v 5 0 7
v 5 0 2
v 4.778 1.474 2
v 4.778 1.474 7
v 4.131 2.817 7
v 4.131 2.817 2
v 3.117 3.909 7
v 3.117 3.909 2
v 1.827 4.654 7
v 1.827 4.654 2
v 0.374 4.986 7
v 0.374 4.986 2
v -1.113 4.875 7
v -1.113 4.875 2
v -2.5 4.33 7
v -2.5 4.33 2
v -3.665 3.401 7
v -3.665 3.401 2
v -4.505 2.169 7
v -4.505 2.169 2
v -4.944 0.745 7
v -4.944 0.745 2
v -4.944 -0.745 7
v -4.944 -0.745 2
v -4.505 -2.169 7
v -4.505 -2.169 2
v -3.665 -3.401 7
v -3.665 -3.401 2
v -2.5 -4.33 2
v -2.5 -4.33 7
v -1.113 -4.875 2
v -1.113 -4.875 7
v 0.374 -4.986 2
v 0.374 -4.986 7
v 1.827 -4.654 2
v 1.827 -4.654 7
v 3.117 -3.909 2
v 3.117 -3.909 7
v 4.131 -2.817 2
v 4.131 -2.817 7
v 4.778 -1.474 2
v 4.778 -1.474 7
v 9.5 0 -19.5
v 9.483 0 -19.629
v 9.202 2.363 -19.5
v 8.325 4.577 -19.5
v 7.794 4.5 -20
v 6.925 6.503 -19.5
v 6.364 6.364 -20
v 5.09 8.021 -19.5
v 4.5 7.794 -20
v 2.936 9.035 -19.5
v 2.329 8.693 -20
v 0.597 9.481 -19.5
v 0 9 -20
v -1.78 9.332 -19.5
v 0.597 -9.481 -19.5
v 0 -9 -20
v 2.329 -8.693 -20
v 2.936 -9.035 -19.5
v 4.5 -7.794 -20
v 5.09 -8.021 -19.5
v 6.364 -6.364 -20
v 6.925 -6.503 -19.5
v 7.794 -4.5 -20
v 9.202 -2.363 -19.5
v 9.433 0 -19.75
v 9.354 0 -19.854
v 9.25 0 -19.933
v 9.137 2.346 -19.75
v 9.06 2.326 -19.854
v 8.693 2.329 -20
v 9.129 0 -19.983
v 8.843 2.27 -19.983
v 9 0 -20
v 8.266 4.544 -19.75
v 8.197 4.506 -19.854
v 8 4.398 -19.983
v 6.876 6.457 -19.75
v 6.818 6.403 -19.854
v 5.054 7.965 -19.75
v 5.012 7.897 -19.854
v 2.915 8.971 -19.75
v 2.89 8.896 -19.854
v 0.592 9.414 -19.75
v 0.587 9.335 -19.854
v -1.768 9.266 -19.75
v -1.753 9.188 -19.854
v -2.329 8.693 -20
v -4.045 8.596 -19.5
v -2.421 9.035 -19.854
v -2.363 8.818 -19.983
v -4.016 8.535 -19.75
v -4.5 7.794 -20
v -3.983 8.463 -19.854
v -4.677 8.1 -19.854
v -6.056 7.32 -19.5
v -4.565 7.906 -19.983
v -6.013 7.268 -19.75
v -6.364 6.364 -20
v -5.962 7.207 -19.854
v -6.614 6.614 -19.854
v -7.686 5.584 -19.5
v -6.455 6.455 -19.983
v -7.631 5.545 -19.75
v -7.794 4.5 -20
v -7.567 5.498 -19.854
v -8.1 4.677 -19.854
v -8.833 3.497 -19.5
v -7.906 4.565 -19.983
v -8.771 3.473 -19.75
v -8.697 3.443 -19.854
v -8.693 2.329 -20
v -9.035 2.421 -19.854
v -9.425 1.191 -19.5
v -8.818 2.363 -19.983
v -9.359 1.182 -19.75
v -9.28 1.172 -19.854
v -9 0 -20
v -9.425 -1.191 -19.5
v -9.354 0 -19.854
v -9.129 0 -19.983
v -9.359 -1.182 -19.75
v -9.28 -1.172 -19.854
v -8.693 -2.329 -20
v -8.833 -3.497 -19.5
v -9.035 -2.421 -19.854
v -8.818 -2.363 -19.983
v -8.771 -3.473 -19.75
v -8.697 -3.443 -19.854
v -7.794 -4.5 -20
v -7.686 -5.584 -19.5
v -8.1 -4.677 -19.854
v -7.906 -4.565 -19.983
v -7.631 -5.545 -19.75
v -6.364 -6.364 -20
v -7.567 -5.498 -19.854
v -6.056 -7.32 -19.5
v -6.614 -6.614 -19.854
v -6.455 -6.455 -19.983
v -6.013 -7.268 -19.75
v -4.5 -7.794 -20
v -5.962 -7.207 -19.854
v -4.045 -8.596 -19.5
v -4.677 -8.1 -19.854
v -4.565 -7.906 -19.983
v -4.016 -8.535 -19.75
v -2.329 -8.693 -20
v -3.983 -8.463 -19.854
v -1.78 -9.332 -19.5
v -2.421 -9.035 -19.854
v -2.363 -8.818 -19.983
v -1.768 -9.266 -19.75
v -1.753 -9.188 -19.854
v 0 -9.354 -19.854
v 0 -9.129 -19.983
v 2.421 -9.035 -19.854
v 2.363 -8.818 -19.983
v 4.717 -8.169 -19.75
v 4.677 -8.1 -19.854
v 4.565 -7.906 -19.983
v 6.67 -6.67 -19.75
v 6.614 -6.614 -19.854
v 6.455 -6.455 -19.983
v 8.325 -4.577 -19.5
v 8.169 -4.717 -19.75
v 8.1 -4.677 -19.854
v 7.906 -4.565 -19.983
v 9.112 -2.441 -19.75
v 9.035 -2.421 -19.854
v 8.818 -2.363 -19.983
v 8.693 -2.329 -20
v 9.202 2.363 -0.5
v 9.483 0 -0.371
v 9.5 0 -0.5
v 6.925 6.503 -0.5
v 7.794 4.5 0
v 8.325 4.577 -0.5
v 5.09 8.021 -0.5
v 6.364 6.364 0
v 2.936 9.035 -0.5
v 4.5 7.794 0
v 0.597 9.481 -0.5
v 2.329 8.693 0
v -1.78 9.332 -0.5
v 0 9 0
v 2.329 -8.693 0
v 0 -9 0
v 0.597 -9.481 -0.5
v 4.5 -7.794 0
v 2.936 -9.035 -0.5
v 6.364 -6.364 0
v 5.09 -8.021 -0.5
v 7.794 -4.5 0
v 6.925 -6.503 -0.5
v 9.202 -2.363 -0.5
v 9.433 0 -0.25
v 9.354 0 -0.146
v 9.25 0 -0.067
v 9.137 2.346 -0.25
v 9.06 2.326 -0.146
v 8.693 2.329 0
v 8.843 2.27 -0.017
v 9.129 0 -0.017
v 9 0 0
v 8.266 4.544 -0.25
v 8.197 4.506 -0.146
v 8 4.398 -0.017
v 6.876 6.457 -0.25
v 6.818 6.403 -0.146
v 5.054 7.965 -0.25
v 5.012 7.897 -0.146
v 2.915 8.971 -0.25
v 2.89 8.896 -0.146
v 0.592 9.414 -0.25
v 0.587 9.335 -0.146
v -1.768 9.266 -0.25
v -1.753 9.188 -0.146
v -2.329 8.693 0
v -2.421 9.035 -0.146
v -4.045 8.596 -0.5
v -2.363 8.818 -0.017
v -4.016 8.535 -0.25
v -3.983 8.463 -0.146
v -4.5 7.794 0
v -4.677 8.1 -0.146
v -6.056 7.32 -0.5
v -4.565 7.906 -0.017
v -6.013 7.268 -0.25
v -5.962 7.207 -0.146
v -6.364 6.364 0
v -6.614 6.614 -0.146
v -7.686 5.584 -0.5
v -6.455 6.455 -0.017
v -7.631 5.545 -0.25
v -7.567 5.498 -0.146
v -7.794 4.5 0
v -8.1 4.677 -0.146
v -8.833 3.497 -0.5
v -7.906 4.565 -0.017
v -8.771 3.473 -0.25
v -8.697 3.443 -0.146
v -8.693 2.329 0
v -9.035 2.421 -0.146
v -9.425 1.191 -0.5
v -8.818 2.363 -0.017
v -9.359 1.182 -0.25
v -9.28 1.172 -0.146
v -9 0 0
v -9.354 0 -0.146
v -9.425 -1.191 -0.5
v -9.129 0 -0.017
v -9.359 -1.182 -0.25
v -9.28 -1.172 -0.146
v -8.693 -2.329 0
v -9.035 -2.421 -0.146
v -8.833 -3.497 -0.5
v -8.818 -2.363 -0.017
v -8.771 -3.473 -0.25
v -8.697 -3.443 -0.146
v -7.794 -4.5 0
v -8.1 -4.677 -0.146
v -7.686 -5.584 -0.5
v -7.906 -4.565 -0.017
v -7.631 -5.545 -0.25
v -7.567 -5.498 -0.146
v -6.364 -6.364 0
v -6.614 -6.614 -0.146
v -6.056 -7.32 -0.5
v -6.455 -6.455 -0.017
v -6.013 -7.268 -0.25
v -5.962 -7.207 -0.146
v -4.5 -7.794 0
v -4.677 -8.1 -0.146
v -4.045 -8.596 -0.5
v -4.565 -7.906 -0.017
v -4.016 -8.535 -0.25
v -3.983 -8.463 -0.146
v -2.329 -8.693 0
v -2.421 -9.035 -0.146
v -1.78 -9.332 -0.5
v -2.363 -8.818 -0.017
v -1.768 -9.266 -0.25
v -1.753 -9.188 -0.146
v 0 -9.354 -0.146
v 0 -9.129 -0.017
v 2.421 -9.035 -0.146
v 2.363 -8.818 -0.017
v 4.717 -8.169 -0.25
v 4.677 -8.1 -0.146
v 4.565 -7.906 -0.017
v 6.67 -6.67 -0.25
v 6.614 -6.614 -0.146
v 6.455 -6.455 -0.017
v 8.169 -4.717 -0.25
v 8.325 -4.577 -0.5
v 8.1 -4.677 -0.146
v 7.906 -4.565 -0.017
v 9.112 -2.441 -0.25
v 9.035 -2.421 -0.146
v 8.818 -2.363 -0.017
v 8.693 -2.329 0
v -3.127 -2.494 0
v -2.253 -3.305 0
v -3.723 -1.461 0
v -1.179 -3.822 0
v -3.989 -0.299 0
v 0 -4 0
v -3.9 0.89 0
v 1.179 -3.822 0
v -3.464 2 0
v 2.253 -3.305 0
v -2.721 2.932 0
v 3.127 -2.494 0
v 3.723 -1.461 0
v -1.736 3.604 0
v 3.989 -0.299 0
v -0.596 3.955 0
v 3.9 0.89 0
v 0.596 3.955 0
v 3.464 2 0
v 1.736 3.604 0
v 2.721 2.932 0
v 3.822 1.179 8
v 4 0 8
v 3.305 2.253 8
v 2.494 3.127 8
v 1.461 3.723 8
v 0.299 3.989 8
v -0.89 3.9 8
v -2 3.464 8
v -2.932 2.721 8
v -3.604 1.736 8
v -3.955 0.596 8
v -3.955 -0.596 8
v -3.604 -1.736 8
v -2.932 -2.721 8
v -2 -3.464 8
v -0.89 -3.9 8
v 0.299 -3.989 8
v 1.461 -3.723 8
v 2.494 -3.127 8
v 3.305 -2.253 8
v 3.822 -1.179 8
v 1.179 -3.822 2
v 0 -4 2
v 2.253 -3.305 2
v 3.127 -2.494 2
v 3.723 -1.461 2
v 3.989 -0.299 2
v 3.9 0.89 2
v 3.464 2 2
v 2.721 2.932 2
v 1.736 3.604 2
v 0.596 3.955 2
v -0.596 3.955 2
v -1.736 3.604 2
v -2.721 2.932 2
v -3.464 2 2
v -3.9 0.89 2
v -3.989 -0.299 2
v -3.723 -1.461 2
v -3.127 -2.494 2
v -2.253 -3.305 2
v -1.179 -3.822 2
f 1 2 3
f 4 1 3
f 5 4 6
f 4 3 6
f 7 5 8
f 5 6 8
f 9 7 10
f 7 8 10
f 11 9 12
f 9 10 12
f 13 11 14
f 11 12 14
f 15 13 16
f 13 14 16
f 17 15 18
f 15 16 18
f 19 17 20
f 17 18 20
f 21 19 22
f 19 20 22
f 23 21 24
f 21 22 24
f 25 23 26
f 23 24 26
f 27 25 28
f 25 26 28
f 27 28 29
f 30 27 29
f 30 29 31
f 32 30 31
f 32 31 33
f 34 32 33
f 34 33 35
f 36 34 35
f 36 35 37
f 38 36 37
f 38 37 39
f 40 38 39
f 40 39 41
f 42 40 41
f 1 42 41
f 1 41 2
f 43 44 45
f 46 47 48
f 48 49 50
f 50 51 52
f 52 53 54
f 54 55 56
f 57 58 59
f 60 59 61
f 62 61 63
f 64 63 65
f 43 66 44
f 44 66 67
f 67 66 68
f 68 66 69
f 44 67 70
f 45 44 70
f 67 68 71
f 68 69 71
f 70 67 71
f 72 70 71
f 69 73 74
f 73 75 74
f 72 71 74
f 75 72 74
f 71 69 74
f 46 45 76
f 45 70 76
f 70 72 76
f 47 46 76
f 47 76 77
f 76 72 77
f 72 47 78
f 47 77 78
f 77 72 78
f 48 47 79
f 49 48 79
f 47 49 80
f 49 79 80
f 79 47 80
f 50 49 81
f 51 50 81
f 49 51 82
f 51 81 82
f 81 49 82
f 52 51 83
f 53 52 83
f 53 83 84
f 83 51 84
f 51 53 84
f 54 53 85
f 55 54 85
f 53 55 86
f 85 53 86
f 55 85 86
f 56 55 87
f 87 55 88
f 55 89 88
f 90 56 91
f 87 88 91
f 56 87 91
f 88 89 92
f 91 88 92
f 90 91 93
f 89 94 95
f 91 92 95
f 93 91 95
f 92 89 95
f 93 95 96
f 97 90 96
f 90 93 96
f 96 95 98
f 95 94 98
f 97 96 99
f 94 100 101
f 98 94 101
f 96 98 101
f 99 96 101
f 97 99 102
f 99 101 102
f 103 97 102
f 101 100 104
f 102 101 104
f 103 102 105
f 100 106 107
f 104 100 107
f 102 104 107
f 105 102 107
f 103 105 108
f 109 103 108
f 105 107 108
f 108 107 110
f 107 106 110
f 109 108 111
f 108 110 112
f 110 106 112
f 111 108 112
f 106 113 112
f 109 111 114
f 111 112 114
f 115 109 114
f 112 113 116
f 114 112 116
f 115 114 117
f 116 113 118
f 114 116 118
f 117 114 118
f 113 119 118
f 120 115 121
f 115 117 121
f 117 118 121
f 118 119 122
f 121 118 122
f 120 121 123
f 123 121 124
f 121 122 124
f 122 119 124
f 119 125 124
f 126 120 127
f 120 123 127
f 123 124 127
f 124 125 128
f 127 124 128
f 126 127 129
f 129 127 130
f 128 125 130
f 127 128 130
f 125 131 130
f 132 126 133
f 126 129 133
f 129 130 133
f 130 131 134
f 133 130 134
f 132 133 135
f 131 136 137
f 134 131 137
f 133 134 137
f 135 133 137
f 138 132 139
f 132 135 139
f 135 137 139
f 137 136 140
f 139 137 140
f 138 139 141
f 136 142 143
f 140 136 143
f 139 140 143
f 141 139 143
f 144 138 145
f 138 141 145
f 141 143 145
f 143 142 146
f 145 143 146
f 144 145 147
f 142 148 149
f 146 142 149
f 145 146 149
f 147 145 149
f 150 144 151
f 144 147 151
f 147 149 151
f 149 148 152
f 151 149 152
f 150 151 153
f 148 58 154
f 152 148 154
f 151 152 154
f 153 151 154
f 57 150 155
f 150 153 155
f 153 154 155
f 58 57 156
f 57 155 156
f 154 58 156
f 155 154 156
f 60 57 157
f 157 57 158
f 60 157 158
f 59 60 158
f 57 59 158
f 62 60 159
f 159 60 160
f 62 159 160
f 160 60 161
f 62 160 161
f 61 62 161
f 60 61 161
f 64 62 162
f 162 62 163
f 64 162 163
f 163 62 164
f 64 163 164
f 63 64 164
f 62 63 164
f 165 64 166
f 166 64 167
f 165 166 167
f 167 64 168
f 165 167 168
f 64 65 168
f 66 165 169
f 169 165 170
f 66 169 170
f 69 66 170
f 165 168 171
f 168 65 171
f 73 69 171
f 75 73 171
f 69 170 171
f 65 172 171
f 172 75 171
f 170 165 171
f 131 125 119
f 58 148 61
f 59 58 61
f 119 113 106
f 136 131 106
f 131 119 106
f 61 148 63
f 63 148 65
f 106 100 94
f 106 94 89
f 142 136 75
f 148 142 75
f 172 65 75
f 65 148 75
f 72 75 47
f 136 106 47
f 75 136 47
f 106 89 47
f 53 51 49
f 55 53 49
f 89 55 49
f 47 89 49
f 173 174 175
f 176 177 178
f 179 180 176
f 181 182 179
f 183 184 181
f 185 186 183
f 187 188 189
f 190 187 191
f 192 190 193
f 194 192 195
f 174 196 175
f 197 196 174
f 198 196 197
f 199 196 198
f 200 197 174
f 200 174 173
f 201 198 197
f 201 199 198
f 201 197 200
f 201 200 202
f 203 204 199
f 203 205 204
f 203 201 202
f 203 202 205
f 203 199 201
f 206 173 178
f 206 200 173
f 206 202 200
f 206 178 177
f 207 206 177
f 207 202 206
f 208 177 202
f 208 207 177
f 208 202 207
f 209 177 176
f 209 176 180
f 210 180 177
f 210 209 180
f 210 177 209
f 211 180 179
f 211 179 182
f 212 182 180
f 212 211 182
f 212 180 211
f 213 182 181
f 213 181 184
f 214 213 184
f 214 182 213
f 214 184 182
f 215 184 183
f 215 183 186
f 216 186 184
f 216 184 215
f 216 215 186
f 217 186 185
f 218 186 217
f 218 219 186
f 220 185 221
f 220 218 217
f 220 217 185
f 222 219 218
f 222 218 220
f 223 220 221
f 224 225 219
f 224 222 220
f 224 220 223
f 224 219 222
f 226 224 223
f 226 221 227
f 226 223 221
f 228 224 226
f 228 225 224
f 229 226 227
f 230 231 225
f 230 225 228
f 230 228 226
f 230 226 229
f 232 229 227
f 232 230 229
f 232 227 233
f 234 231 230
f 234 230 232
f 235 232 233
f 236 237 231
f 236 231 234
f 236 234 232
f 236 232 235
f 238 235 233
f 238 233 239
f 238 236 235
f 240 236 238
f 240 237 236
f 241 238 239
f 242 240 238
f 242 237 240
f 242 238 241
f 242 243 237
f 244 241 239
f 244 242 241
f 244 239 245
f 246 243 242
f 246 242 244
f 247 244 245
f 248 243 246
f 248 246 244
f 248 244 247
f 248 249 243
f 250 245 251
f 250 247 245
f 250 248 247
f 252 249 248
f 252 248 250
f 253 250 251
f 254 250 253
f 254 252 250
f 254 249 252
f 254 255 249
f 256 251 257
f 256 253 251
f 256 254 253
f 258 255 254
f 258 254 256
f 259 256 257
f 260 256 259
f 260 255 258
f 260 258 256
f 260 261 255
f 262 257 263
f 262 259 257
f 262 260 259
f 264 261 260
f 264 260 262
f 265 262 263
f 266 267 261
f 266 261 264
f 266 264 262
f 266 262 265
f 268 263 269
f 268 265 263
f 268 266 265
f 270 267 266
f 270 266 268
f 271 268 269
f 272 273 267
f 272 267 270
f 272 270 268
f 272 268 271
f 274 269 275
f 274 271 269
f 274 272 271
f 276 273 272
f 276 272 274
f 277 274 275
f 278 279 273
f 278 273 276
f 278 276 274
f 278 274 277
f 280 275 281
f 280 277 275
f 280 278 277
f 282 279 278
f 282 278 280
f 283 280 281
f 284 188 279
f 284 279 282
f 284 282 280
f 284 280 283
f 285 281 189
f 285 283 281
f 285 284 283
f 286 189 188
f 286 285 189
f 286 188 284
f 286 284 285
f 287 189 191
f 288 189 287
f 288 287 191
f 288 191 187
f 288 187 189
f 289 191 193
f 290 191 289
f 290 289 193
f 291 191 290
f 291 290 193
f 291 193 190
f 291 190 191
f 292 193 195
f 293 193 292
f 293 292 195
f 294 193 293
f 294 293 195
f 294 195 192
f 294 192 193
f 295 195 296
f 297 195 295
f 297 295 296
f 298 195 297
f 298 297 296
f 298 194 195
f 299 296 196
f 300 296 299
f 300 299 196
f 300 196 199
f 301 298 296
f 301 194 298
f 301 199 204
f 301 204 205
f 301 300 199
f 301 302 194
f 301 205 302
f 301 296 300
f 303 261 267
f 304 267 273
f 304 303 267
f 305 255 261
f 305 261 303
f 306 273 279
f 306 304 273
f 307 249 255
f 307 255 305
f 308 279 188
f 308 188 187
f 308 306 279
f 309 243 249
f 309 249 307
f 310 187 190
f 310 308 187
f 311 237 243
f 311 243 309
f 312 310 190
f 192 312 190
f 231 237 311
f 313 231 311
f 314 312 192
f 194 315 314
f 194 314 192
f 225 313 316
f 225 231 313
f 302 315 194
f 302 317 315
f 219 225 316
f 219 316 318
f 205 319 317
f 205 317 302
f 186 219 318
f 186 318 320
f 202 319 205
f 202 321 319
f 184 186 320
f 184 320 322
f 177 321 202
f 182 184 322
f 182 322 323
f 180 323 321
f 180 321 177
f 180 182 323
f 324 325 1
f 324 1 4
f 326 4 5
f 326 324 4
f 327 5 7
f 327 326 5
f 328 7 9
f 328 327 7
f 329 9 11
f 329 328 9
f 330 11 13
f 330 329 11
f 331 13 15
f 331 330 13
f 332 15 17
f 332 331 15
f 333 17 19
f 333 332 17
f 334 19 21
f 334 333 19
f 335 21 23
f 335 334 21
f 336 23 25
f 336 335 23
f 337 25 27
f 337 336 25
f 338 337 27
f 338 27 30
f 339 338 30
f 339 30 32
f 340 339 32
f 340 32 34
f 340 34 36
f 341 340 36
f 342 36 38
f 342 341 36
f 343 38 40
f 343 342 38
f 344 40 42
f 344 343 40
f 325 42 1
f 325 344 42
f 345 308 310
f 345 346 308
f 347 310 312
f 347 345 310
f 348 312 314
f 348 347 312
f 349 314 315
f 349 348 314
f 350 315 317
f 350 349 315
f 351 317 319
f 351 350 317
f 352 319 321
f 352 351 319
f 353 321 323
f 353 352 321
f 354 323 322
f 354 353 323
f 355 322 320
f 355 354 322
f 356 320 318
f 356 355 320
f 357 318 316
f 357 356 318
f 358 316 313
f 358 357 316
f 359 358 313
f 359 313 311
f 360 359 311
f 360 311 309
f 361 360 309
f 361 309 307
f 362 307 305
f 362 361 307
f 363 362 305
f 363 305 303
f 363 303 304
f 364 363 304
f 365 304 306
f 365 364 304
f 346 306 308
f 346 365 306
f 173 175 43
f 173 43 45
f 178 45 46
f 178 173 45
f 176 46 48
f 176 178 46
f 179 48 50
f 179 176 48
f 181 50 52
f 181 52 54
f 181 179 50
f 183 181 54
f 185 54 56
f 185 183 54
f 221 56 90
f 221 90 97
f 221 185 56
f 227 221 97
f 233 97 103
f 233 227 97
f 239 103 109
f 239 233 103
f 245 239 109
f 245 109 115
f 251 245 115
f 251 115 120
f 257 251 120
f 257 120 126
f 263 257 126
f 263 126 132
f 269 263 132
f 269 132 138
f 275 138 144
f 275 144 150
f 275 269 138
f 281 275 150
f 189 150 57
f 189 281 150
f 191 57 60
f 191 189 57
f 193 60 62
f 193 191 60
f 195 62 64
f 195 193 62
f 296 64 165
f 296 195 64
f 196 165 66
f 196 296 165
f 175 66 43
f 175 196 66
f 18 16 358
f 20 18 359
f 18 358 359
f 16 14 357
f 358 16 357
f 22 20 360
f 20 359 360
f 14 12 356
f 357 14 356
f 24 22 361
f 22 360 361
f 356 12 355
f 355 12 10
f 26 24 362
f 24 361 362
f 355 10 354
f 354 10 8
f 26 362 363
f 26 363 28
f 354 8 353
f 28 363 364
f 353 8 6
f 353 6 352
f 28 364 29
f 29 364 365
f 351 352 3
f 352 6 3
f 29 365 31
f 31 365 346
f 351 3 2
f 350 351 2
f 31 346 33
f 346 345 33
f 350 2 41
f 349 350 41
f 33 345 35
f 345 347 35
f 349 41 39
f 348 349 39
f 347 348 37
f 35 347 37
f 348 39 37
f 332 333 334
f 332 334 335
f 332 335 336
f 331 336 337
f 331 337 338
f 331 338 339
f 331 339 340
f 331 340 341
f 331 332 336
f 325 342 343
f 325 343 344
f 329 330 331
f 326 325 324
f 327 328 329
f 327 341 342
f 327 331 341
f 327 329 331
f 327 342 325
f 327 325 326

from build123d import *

# Parameters (mm, degrees)
F0_R     = 9.5
F1_DEPTH = 20
F2_R     = 5
F3_DEPTH = 8
F4_R     = 0.5
F5_SIZE  = 1
F6_W     = 1
F6_H     = 2


with BuildPart() as f1:
    # F0 (on Top) → F1 (new body)
    with BuildSketch(Plane.XY):
        Circle(F0_R)
    extrude(amount=-F1_DEPTH)

    # F2 (on face) → F3 (join)
    with BuildSketch(Plane.XY):
        Circle(F2_R)
    extrude(amount=F3_DEPTH)

    # F4
    f4_edges = [f1.edges().sort_by_distance(p)[0] for p in [
        (-9.5, 0, -20),
        (-9.5, 0, 0),
    ]]
    fillet(f4_edges, radius=F4_R)

    # F5
    f5_edges = [f1.edges().sort_by_distance(p)[0] for p in [
        (-5, 0, 8),
    ]]
    chamfer(f5_edges, length=F5_SIZE)

    # F6 (on Right) → F7 (revolve, cut)
    with BuildSketch(Plane.YZ):
        with Locations((-4.5, 1)):
            Rectangle(F6_W, F6_H)
    revolve(axis=Axis((0, 0, 7.854766), (0, 0, 1)), mode=Mode.SUBTRACT)


solid = f1.part
